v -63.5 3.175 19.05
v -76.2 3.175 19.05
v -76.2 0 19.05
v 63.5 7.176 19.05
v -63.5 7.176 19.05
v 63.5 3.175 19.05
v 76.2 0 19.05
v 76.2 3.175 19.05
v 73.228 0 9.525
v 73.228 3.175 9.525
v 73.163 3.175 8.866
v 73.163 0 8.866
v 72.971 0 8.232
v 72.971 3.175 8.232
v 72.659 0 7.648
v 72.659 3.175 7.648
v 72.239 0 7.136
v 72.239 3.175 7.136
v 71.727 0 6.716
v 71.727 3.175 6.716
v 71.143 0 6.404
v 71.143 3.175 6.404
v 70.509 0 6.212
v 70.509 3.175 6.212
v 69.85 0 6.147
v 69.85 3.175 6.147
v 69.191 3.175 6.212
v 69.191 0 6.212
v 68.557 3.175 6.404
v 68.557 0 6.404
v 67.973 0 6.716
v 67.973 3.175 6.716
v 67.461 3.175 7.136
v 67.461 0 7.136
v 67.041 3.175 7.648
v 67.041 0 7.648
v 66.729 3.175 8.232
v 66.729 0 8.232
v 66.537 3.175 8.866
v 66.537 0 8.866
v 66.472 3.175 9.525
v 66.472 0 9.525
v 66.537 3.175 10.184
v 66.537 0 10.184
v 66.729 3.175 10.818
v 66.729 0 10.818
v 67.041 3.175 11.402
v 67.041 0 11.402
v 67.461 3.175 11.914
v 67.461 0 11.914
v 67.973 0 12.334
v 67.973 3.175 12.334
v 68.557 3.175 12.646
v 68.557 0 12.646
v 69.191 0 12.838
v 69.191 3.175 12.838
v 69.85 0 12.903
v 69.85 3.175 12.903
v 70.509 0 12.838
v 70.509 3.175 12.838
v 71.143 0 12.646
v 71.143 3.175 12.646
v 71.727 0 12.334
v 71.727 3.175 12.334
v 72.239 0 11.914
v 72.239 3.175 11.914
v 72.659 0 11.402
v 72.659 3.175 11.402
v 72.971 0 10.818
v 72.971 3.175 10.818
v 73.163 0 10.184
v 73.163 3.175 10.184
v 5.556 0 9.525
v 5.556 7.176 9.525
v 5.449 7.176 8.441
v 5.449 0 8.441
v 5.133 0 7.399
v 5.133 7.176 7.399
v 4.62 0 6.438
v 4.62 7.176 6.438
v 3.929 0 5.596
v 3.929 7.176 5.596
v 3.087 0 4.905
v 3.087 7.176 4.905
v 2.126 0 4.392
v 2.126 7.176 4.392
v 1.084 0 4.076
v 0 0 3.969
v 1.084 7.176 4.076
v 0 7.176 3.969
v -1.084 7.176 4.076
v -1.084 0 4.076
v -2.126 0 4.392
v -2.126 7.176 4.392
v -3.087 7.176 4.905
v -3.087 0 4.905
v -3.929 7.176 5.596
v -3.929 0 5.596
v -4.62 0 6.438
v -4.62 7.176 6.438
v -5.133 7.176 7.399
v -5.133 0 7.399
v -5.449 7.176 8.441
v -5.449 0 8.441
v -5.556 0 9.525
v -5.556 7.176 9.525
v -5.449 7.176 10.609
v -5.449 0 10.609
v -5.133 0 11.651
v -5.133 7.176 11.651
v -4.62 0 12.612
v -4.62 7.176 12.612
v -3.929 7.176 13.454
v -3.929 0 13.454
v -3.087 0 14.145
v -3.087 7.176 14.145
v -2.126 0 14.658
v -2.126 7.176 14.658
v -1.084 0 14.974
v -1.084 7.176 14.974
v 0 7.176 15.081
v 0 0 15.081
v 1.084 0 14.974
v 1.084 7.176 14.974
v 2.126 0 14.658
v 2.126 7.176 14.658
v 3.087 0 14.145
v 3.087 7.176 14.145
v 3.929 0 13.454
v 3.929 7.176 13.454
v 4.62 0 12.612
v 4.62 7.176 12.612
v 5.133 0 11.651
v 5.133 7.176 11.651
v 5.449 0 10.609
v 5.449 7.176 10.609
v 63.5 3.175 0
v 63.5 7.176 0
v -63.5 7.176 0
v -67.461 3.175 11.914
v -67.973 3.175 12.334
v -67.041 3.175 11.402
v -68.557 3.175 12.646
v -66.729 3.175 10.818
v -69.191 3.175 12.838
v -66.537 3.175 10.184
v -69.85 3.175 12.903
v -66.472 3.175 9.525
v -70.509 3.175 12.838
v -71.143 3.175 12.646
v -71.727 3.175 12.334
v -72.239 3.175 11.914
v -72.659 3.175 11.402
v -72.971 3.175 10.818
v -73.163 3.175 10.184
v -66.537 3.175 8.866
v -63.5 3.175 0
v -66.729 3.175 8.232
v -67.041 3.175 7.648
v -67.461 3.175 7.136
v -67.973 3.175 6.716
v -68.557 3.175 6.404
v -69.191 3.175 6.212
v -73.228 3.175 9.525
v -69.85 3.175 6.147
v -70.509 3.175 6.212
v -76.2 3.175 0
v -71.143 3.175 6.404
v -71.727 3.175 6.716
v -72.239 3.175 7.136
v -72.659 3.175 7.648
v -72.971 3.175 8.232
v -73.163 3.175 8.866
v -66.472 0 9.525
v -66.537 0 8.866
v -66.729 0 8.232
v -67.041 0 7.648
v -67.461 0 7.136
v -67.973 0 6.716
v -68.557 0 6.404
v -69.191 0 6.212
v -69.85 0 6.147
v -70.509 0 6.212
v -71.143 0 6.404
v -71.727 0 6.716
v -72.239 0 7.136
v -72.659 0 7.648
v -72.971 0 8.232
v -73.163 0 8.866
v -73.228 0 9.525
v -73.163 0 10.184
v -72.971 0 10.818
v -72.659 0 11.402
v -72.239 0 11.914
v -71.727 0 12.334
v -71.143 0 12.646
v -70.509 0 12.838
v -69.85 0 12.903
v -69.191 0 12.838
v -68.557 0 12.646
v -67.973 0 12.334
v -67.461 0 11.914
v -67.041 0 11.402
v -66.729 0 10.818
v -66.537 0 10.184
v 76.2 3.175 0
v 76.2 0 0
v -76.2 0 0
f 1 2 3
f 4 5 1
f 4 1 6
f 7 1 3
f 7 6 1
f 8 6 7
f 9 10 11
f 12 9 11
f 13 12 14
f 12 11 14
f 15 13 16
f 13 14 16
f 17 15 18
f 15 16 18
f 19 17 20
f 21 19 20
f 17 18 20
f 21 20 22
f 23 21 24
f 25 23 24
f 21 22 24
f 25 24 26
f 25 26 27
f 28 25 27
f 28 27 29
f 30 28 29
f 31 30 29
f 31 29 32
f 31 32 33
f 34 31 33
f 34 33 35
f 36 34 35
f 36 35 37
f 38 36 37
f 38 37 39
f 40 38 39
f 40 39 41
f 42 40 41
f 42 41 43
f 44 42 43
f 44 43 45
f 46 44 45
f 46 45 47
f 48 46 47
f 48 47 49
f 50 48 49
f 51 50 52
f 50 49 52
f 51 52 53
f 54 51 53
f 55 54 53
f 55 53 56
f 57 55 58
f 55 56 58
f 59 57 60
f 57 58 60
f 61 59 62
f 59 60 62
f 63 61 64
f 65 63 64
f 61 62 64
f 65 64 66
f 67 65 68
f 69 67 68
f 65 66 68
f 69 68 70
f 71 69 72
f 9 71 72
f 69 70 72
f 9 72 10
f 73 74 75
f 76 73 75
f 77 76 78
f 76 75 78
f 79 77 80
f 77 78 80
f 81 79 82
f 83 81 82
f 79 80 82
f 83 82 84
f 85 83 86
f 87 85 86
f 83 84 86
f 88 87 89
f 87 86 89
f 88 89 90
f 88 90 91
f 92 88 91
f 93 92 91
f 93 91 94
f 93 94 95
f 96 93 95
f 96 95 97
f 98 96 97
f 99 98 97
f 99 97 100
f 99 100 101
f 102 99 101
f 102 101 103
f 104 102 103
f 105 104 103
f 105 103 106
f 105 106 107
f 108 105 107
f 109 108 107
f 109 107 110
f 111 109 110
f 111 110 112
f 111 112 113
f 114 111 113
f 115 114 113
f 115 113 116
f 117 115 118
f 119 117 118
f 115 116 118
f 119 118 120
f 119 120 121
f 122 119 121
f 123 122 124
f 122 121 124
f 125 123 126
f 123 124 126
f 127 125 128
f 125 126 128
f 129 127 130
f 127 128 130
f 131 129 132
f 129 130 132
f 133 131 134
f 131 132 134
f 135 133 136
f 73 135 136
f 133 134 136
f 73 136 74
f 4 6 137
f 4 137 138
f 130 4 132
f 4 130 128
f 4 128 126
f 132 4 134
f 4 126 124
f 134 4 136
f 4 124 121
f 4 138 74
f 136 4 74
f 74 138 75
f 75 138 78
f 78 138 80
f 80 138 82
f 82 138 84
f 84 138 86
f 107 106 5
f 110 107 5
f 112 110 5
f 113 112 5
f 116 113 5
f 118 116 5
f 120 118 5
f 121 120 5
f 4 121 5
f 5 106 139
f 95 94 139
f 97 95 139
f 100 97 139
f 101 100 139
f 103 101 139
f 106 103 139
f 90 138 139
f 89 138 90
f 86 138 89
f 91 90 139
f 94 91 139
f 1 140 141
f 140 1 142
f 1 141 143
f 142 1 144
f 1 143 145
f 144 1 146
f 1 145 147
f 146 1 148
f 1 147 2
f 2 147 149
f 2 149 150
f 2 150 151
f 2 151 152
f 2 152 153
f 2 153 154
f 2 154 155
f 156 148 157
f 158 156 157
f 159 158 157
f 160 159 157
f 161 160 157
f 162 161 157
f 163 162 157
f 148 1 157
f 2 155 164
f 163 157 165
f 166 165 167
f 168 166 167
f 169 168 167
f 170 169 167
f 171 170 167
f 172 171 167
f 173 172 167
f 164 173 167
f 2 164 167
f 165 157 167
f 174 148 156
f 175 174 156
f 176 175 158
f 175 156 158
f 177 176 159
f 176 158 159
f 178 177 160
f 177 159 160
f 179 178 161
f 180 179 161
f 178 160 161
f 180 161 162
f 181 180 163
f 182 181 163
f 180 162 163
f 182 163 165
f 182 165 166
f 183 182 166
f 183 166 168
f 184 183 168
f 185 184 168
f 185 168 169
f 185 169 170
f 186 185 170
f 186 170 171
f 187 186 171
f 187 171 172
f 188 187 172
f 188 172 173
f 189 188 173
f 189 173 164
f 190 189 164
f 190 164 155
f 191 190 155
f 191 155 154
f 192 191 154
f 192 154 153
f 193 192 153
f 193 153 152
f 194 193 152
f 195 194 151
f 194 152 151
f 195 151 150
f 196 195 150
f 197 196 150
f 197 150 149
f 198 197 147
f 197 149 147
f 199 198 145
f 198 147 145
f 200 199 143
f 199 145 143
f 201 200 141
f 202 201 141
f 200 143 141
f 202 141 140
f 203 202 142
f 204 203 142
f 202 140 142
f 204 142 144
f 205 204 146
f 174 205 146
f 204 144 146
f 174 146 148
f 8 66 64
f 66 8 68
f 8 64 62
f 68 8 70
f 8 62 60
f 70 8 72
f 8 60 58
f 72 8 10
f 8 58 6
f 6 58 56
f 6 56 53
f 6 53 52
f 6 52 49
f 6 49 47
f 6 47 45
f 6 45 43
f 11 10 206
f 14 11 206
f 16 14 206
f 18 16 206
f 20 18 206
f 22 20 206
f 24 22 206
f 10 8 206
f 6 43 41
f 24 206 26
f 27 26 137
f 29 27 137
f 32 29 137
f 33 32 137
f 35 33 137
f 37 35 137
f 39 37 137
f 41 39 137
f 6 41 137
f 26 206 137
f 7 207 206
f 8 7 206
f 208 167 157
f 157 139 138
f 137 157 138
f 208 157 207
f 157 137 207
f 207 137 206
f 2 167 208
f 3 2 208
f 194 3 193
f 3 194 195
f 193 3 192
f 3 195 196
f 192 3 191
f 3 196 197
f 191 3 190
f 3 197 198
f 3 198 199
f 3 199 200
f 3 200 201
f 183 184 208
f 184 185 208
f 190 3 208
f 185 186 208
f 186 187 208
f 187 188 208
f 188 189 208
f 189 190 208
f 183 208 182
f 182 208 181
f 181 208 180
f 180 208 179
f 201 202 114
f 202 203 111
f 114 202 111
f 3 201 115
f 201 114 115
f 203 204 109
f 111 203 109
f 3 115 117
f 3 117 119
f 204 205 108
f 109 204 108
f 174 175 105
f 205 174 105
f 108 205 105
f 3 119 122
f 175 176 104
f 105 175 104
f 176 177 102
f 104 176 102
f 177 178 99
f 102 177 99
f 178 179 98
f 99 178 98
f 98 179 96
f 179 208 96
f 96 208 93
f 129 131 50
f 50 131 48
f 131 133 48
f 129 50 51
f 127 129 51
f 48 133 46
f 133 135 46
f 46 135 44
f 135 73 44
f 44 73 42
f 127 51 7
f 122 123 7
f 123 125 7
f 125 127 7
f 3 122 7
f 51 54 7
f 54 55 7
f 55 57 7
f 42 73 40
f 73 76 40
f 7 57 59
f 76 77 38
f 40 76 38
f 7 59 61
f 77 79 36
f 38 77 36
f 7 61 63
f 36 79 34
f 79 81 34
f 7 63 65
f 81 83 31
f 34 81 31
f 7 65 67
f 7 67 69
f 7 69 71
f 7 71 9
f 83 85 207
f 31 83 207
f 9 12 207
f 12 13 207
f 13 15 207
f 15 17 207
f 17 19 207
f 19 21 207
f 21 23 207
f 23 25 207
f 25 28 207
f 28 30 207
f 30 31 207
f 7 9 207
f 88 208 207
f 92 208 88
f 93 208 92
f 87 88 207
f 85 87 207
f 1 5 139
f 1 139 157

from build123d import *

# Parameters (mm, degrees)
BOSS_EXTRUDE1_DEPTH = 19.05
SKETCH2_R           = 5.55625
CUT_EXTRUDE1_DEPTH  = 8.1755
SKETCH3_R           = 3.3782
CUT_EXTRUDE2_DEPTH  = 4.175


with BuildPart() as part:
    # Sketch1 → Boss-Extrude1 (new body)
    with BuildSketch(Plane.XY):
        Polygon((-76.2, 0), (76.2, 0), (76.2, 3.175), (63.5, 3.175), (63.5, 7.1755), (-63.5, 7.1755), (-63.5, 3.175), (-76.2, 3.175), align=None)
    extrude(amount=BOSS_EXTRUDE1_DEPTH)

    # Sketch2 → Cut-Extrude1 (cut, through all)
    with BuildSketch(Plane(origin=(0, 7.1755, 0), x_dir=(1, 0, 0), z_dir=(0, 1, 0))):
        with Locations((0, -9.525)):
            Circle(SKETCH2_R)
    extrude(amount=-CUT_EXTRUDE1_DEPTH, mode=Mode.SUBTRACT)

    # Sketch3 → Cut-Extrude2 (cut, through all)
    with BuildSketch(Plane(origin=(0, 3.175, 0), x_dir=(1, 0, 0), z_dir=(0, 1, 0))):
        with Locations((-69.85, -9.525)):
            Circle(SKETCH3_R)
        with Locations((69.85, -9.525)):
            Circle(SKETCH3_R)
    extrude(amount=-CUT_EXTRUDE2_DEPTH, mode=Mode.SUBTRACT)


solid = part.part
